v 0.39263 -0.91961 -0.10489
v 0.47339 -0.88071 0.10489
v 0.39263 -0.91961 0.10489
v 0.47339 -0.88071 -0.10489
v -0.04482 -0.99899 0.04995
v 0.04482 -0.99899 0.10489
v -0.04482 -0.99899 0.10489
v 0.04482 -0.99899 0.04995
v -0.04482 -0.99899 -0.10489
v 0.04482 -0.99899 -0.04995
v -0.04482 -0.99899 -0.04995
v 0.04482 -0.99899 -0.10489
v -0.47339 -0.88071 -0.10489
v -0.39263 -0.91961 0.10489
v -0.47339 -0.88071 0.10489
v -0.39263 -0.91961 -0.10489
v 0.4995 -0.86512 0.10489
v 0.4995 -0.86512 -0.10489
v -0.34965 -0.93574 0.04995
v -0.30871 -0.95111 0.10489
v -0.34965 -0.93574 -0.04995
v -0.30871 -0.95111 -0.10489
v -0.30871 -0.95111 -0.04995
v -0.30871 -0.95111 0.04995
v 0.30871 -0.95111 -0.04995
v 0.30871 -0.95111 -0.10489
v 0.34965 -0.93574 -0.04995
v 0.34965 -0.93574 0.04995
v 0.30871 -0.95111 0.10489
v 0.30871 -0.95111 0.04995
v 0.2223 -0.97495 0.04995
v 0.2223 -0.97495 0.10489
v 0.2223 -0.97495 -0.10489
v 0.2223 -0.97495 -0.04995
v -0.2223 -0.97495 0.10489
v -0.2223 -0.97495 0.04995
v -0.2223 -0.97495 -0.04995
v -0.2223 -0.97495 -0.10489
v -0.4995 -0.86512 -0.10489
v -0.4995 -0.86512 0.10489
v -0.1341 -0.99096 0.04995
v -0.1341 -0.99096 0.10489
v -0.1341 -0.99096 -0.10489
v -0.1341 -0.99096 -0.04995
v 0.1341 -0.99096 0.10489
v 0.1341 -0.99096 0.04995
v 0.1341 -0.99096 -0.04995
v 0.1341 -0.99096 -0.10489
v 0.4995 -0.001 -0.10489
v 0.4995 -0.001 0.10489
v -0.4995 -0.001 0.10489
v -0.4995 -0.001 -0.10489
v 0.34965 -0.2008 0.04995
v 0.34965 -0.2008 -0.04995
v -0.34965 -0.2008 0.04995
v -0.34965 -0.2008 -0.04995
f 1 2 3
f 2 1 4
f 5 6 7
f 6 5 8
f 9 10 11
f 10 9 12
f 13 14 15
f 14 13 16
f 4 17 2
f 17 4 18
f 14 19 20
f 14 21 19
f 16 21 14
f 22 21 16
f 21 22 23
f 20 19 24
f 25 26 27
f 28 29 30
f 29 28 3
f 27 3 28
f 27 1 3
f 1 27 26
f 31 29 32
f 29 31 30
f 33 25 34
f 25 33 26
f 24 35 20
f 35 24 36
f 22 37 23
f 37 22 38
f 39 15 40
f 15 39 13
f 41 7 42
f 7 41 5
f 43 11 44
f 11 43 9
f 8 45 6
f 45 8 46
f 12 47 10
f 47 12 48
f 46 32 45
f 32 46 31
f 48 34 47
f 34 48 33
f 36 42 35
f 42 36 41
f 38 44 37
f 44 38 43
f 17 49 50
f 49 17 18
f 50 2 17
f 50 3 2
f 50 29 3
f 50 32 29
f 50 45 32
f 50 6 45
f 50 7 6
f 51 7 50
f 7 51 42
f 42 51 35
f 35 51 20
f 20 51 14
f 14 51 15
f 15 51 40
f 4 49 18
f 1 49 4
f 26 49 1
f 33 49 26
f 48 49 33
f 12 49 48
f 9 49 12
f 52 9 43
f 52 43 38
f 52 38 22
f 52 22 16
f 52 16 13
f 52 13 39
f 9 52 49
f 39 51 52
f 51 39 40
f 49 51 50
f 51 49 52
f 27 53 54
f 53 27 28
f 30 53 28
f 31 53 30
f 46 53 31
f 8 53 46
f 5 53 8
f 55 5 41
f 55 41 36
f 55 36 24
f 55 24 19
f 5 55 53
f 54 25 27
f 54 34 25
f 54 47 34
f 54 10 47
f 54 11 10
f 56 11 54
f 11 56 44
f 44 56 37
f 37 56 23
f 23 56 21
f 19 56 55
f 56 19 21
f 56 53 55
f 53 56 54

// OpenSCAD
l=2;
x=2;
g=2.5;
t=0.7;
h=0.1;
s=0.1;
translate([0,-0.001,0]) scale([0.999,0.999,0.999])
  color("red") difference() {
    translate([0,-x/4,0])
      cube([l/2,x/2,0.21],center=true);
    difference() {
      cube([g,g,0.3],center=true);
      cylinder(h=0.4,r=1,center=true,$fn=70);
    }
    translate([-t/2,-1.2,-h/2]) 
      color("blue",0.4) cube([t,1,h]);
  }

//color("gold") difference() {
//  rotate([0,0,-18]) difference() {
//      cylinder(h=0.2,r=1,center=true,$fn=70);
//      translate([0,0.5,0])
//          cylinder(h=1,r=0.3,center=true,$fn=50);
//      translate([-0.75,0,0])
//          cylinder(h=1,r=0.1,center=true,$fn=30);
//  }
//  translate([0,-x/4,0])
//    cube([l/2,x/2,0.25],center=true);
//}
